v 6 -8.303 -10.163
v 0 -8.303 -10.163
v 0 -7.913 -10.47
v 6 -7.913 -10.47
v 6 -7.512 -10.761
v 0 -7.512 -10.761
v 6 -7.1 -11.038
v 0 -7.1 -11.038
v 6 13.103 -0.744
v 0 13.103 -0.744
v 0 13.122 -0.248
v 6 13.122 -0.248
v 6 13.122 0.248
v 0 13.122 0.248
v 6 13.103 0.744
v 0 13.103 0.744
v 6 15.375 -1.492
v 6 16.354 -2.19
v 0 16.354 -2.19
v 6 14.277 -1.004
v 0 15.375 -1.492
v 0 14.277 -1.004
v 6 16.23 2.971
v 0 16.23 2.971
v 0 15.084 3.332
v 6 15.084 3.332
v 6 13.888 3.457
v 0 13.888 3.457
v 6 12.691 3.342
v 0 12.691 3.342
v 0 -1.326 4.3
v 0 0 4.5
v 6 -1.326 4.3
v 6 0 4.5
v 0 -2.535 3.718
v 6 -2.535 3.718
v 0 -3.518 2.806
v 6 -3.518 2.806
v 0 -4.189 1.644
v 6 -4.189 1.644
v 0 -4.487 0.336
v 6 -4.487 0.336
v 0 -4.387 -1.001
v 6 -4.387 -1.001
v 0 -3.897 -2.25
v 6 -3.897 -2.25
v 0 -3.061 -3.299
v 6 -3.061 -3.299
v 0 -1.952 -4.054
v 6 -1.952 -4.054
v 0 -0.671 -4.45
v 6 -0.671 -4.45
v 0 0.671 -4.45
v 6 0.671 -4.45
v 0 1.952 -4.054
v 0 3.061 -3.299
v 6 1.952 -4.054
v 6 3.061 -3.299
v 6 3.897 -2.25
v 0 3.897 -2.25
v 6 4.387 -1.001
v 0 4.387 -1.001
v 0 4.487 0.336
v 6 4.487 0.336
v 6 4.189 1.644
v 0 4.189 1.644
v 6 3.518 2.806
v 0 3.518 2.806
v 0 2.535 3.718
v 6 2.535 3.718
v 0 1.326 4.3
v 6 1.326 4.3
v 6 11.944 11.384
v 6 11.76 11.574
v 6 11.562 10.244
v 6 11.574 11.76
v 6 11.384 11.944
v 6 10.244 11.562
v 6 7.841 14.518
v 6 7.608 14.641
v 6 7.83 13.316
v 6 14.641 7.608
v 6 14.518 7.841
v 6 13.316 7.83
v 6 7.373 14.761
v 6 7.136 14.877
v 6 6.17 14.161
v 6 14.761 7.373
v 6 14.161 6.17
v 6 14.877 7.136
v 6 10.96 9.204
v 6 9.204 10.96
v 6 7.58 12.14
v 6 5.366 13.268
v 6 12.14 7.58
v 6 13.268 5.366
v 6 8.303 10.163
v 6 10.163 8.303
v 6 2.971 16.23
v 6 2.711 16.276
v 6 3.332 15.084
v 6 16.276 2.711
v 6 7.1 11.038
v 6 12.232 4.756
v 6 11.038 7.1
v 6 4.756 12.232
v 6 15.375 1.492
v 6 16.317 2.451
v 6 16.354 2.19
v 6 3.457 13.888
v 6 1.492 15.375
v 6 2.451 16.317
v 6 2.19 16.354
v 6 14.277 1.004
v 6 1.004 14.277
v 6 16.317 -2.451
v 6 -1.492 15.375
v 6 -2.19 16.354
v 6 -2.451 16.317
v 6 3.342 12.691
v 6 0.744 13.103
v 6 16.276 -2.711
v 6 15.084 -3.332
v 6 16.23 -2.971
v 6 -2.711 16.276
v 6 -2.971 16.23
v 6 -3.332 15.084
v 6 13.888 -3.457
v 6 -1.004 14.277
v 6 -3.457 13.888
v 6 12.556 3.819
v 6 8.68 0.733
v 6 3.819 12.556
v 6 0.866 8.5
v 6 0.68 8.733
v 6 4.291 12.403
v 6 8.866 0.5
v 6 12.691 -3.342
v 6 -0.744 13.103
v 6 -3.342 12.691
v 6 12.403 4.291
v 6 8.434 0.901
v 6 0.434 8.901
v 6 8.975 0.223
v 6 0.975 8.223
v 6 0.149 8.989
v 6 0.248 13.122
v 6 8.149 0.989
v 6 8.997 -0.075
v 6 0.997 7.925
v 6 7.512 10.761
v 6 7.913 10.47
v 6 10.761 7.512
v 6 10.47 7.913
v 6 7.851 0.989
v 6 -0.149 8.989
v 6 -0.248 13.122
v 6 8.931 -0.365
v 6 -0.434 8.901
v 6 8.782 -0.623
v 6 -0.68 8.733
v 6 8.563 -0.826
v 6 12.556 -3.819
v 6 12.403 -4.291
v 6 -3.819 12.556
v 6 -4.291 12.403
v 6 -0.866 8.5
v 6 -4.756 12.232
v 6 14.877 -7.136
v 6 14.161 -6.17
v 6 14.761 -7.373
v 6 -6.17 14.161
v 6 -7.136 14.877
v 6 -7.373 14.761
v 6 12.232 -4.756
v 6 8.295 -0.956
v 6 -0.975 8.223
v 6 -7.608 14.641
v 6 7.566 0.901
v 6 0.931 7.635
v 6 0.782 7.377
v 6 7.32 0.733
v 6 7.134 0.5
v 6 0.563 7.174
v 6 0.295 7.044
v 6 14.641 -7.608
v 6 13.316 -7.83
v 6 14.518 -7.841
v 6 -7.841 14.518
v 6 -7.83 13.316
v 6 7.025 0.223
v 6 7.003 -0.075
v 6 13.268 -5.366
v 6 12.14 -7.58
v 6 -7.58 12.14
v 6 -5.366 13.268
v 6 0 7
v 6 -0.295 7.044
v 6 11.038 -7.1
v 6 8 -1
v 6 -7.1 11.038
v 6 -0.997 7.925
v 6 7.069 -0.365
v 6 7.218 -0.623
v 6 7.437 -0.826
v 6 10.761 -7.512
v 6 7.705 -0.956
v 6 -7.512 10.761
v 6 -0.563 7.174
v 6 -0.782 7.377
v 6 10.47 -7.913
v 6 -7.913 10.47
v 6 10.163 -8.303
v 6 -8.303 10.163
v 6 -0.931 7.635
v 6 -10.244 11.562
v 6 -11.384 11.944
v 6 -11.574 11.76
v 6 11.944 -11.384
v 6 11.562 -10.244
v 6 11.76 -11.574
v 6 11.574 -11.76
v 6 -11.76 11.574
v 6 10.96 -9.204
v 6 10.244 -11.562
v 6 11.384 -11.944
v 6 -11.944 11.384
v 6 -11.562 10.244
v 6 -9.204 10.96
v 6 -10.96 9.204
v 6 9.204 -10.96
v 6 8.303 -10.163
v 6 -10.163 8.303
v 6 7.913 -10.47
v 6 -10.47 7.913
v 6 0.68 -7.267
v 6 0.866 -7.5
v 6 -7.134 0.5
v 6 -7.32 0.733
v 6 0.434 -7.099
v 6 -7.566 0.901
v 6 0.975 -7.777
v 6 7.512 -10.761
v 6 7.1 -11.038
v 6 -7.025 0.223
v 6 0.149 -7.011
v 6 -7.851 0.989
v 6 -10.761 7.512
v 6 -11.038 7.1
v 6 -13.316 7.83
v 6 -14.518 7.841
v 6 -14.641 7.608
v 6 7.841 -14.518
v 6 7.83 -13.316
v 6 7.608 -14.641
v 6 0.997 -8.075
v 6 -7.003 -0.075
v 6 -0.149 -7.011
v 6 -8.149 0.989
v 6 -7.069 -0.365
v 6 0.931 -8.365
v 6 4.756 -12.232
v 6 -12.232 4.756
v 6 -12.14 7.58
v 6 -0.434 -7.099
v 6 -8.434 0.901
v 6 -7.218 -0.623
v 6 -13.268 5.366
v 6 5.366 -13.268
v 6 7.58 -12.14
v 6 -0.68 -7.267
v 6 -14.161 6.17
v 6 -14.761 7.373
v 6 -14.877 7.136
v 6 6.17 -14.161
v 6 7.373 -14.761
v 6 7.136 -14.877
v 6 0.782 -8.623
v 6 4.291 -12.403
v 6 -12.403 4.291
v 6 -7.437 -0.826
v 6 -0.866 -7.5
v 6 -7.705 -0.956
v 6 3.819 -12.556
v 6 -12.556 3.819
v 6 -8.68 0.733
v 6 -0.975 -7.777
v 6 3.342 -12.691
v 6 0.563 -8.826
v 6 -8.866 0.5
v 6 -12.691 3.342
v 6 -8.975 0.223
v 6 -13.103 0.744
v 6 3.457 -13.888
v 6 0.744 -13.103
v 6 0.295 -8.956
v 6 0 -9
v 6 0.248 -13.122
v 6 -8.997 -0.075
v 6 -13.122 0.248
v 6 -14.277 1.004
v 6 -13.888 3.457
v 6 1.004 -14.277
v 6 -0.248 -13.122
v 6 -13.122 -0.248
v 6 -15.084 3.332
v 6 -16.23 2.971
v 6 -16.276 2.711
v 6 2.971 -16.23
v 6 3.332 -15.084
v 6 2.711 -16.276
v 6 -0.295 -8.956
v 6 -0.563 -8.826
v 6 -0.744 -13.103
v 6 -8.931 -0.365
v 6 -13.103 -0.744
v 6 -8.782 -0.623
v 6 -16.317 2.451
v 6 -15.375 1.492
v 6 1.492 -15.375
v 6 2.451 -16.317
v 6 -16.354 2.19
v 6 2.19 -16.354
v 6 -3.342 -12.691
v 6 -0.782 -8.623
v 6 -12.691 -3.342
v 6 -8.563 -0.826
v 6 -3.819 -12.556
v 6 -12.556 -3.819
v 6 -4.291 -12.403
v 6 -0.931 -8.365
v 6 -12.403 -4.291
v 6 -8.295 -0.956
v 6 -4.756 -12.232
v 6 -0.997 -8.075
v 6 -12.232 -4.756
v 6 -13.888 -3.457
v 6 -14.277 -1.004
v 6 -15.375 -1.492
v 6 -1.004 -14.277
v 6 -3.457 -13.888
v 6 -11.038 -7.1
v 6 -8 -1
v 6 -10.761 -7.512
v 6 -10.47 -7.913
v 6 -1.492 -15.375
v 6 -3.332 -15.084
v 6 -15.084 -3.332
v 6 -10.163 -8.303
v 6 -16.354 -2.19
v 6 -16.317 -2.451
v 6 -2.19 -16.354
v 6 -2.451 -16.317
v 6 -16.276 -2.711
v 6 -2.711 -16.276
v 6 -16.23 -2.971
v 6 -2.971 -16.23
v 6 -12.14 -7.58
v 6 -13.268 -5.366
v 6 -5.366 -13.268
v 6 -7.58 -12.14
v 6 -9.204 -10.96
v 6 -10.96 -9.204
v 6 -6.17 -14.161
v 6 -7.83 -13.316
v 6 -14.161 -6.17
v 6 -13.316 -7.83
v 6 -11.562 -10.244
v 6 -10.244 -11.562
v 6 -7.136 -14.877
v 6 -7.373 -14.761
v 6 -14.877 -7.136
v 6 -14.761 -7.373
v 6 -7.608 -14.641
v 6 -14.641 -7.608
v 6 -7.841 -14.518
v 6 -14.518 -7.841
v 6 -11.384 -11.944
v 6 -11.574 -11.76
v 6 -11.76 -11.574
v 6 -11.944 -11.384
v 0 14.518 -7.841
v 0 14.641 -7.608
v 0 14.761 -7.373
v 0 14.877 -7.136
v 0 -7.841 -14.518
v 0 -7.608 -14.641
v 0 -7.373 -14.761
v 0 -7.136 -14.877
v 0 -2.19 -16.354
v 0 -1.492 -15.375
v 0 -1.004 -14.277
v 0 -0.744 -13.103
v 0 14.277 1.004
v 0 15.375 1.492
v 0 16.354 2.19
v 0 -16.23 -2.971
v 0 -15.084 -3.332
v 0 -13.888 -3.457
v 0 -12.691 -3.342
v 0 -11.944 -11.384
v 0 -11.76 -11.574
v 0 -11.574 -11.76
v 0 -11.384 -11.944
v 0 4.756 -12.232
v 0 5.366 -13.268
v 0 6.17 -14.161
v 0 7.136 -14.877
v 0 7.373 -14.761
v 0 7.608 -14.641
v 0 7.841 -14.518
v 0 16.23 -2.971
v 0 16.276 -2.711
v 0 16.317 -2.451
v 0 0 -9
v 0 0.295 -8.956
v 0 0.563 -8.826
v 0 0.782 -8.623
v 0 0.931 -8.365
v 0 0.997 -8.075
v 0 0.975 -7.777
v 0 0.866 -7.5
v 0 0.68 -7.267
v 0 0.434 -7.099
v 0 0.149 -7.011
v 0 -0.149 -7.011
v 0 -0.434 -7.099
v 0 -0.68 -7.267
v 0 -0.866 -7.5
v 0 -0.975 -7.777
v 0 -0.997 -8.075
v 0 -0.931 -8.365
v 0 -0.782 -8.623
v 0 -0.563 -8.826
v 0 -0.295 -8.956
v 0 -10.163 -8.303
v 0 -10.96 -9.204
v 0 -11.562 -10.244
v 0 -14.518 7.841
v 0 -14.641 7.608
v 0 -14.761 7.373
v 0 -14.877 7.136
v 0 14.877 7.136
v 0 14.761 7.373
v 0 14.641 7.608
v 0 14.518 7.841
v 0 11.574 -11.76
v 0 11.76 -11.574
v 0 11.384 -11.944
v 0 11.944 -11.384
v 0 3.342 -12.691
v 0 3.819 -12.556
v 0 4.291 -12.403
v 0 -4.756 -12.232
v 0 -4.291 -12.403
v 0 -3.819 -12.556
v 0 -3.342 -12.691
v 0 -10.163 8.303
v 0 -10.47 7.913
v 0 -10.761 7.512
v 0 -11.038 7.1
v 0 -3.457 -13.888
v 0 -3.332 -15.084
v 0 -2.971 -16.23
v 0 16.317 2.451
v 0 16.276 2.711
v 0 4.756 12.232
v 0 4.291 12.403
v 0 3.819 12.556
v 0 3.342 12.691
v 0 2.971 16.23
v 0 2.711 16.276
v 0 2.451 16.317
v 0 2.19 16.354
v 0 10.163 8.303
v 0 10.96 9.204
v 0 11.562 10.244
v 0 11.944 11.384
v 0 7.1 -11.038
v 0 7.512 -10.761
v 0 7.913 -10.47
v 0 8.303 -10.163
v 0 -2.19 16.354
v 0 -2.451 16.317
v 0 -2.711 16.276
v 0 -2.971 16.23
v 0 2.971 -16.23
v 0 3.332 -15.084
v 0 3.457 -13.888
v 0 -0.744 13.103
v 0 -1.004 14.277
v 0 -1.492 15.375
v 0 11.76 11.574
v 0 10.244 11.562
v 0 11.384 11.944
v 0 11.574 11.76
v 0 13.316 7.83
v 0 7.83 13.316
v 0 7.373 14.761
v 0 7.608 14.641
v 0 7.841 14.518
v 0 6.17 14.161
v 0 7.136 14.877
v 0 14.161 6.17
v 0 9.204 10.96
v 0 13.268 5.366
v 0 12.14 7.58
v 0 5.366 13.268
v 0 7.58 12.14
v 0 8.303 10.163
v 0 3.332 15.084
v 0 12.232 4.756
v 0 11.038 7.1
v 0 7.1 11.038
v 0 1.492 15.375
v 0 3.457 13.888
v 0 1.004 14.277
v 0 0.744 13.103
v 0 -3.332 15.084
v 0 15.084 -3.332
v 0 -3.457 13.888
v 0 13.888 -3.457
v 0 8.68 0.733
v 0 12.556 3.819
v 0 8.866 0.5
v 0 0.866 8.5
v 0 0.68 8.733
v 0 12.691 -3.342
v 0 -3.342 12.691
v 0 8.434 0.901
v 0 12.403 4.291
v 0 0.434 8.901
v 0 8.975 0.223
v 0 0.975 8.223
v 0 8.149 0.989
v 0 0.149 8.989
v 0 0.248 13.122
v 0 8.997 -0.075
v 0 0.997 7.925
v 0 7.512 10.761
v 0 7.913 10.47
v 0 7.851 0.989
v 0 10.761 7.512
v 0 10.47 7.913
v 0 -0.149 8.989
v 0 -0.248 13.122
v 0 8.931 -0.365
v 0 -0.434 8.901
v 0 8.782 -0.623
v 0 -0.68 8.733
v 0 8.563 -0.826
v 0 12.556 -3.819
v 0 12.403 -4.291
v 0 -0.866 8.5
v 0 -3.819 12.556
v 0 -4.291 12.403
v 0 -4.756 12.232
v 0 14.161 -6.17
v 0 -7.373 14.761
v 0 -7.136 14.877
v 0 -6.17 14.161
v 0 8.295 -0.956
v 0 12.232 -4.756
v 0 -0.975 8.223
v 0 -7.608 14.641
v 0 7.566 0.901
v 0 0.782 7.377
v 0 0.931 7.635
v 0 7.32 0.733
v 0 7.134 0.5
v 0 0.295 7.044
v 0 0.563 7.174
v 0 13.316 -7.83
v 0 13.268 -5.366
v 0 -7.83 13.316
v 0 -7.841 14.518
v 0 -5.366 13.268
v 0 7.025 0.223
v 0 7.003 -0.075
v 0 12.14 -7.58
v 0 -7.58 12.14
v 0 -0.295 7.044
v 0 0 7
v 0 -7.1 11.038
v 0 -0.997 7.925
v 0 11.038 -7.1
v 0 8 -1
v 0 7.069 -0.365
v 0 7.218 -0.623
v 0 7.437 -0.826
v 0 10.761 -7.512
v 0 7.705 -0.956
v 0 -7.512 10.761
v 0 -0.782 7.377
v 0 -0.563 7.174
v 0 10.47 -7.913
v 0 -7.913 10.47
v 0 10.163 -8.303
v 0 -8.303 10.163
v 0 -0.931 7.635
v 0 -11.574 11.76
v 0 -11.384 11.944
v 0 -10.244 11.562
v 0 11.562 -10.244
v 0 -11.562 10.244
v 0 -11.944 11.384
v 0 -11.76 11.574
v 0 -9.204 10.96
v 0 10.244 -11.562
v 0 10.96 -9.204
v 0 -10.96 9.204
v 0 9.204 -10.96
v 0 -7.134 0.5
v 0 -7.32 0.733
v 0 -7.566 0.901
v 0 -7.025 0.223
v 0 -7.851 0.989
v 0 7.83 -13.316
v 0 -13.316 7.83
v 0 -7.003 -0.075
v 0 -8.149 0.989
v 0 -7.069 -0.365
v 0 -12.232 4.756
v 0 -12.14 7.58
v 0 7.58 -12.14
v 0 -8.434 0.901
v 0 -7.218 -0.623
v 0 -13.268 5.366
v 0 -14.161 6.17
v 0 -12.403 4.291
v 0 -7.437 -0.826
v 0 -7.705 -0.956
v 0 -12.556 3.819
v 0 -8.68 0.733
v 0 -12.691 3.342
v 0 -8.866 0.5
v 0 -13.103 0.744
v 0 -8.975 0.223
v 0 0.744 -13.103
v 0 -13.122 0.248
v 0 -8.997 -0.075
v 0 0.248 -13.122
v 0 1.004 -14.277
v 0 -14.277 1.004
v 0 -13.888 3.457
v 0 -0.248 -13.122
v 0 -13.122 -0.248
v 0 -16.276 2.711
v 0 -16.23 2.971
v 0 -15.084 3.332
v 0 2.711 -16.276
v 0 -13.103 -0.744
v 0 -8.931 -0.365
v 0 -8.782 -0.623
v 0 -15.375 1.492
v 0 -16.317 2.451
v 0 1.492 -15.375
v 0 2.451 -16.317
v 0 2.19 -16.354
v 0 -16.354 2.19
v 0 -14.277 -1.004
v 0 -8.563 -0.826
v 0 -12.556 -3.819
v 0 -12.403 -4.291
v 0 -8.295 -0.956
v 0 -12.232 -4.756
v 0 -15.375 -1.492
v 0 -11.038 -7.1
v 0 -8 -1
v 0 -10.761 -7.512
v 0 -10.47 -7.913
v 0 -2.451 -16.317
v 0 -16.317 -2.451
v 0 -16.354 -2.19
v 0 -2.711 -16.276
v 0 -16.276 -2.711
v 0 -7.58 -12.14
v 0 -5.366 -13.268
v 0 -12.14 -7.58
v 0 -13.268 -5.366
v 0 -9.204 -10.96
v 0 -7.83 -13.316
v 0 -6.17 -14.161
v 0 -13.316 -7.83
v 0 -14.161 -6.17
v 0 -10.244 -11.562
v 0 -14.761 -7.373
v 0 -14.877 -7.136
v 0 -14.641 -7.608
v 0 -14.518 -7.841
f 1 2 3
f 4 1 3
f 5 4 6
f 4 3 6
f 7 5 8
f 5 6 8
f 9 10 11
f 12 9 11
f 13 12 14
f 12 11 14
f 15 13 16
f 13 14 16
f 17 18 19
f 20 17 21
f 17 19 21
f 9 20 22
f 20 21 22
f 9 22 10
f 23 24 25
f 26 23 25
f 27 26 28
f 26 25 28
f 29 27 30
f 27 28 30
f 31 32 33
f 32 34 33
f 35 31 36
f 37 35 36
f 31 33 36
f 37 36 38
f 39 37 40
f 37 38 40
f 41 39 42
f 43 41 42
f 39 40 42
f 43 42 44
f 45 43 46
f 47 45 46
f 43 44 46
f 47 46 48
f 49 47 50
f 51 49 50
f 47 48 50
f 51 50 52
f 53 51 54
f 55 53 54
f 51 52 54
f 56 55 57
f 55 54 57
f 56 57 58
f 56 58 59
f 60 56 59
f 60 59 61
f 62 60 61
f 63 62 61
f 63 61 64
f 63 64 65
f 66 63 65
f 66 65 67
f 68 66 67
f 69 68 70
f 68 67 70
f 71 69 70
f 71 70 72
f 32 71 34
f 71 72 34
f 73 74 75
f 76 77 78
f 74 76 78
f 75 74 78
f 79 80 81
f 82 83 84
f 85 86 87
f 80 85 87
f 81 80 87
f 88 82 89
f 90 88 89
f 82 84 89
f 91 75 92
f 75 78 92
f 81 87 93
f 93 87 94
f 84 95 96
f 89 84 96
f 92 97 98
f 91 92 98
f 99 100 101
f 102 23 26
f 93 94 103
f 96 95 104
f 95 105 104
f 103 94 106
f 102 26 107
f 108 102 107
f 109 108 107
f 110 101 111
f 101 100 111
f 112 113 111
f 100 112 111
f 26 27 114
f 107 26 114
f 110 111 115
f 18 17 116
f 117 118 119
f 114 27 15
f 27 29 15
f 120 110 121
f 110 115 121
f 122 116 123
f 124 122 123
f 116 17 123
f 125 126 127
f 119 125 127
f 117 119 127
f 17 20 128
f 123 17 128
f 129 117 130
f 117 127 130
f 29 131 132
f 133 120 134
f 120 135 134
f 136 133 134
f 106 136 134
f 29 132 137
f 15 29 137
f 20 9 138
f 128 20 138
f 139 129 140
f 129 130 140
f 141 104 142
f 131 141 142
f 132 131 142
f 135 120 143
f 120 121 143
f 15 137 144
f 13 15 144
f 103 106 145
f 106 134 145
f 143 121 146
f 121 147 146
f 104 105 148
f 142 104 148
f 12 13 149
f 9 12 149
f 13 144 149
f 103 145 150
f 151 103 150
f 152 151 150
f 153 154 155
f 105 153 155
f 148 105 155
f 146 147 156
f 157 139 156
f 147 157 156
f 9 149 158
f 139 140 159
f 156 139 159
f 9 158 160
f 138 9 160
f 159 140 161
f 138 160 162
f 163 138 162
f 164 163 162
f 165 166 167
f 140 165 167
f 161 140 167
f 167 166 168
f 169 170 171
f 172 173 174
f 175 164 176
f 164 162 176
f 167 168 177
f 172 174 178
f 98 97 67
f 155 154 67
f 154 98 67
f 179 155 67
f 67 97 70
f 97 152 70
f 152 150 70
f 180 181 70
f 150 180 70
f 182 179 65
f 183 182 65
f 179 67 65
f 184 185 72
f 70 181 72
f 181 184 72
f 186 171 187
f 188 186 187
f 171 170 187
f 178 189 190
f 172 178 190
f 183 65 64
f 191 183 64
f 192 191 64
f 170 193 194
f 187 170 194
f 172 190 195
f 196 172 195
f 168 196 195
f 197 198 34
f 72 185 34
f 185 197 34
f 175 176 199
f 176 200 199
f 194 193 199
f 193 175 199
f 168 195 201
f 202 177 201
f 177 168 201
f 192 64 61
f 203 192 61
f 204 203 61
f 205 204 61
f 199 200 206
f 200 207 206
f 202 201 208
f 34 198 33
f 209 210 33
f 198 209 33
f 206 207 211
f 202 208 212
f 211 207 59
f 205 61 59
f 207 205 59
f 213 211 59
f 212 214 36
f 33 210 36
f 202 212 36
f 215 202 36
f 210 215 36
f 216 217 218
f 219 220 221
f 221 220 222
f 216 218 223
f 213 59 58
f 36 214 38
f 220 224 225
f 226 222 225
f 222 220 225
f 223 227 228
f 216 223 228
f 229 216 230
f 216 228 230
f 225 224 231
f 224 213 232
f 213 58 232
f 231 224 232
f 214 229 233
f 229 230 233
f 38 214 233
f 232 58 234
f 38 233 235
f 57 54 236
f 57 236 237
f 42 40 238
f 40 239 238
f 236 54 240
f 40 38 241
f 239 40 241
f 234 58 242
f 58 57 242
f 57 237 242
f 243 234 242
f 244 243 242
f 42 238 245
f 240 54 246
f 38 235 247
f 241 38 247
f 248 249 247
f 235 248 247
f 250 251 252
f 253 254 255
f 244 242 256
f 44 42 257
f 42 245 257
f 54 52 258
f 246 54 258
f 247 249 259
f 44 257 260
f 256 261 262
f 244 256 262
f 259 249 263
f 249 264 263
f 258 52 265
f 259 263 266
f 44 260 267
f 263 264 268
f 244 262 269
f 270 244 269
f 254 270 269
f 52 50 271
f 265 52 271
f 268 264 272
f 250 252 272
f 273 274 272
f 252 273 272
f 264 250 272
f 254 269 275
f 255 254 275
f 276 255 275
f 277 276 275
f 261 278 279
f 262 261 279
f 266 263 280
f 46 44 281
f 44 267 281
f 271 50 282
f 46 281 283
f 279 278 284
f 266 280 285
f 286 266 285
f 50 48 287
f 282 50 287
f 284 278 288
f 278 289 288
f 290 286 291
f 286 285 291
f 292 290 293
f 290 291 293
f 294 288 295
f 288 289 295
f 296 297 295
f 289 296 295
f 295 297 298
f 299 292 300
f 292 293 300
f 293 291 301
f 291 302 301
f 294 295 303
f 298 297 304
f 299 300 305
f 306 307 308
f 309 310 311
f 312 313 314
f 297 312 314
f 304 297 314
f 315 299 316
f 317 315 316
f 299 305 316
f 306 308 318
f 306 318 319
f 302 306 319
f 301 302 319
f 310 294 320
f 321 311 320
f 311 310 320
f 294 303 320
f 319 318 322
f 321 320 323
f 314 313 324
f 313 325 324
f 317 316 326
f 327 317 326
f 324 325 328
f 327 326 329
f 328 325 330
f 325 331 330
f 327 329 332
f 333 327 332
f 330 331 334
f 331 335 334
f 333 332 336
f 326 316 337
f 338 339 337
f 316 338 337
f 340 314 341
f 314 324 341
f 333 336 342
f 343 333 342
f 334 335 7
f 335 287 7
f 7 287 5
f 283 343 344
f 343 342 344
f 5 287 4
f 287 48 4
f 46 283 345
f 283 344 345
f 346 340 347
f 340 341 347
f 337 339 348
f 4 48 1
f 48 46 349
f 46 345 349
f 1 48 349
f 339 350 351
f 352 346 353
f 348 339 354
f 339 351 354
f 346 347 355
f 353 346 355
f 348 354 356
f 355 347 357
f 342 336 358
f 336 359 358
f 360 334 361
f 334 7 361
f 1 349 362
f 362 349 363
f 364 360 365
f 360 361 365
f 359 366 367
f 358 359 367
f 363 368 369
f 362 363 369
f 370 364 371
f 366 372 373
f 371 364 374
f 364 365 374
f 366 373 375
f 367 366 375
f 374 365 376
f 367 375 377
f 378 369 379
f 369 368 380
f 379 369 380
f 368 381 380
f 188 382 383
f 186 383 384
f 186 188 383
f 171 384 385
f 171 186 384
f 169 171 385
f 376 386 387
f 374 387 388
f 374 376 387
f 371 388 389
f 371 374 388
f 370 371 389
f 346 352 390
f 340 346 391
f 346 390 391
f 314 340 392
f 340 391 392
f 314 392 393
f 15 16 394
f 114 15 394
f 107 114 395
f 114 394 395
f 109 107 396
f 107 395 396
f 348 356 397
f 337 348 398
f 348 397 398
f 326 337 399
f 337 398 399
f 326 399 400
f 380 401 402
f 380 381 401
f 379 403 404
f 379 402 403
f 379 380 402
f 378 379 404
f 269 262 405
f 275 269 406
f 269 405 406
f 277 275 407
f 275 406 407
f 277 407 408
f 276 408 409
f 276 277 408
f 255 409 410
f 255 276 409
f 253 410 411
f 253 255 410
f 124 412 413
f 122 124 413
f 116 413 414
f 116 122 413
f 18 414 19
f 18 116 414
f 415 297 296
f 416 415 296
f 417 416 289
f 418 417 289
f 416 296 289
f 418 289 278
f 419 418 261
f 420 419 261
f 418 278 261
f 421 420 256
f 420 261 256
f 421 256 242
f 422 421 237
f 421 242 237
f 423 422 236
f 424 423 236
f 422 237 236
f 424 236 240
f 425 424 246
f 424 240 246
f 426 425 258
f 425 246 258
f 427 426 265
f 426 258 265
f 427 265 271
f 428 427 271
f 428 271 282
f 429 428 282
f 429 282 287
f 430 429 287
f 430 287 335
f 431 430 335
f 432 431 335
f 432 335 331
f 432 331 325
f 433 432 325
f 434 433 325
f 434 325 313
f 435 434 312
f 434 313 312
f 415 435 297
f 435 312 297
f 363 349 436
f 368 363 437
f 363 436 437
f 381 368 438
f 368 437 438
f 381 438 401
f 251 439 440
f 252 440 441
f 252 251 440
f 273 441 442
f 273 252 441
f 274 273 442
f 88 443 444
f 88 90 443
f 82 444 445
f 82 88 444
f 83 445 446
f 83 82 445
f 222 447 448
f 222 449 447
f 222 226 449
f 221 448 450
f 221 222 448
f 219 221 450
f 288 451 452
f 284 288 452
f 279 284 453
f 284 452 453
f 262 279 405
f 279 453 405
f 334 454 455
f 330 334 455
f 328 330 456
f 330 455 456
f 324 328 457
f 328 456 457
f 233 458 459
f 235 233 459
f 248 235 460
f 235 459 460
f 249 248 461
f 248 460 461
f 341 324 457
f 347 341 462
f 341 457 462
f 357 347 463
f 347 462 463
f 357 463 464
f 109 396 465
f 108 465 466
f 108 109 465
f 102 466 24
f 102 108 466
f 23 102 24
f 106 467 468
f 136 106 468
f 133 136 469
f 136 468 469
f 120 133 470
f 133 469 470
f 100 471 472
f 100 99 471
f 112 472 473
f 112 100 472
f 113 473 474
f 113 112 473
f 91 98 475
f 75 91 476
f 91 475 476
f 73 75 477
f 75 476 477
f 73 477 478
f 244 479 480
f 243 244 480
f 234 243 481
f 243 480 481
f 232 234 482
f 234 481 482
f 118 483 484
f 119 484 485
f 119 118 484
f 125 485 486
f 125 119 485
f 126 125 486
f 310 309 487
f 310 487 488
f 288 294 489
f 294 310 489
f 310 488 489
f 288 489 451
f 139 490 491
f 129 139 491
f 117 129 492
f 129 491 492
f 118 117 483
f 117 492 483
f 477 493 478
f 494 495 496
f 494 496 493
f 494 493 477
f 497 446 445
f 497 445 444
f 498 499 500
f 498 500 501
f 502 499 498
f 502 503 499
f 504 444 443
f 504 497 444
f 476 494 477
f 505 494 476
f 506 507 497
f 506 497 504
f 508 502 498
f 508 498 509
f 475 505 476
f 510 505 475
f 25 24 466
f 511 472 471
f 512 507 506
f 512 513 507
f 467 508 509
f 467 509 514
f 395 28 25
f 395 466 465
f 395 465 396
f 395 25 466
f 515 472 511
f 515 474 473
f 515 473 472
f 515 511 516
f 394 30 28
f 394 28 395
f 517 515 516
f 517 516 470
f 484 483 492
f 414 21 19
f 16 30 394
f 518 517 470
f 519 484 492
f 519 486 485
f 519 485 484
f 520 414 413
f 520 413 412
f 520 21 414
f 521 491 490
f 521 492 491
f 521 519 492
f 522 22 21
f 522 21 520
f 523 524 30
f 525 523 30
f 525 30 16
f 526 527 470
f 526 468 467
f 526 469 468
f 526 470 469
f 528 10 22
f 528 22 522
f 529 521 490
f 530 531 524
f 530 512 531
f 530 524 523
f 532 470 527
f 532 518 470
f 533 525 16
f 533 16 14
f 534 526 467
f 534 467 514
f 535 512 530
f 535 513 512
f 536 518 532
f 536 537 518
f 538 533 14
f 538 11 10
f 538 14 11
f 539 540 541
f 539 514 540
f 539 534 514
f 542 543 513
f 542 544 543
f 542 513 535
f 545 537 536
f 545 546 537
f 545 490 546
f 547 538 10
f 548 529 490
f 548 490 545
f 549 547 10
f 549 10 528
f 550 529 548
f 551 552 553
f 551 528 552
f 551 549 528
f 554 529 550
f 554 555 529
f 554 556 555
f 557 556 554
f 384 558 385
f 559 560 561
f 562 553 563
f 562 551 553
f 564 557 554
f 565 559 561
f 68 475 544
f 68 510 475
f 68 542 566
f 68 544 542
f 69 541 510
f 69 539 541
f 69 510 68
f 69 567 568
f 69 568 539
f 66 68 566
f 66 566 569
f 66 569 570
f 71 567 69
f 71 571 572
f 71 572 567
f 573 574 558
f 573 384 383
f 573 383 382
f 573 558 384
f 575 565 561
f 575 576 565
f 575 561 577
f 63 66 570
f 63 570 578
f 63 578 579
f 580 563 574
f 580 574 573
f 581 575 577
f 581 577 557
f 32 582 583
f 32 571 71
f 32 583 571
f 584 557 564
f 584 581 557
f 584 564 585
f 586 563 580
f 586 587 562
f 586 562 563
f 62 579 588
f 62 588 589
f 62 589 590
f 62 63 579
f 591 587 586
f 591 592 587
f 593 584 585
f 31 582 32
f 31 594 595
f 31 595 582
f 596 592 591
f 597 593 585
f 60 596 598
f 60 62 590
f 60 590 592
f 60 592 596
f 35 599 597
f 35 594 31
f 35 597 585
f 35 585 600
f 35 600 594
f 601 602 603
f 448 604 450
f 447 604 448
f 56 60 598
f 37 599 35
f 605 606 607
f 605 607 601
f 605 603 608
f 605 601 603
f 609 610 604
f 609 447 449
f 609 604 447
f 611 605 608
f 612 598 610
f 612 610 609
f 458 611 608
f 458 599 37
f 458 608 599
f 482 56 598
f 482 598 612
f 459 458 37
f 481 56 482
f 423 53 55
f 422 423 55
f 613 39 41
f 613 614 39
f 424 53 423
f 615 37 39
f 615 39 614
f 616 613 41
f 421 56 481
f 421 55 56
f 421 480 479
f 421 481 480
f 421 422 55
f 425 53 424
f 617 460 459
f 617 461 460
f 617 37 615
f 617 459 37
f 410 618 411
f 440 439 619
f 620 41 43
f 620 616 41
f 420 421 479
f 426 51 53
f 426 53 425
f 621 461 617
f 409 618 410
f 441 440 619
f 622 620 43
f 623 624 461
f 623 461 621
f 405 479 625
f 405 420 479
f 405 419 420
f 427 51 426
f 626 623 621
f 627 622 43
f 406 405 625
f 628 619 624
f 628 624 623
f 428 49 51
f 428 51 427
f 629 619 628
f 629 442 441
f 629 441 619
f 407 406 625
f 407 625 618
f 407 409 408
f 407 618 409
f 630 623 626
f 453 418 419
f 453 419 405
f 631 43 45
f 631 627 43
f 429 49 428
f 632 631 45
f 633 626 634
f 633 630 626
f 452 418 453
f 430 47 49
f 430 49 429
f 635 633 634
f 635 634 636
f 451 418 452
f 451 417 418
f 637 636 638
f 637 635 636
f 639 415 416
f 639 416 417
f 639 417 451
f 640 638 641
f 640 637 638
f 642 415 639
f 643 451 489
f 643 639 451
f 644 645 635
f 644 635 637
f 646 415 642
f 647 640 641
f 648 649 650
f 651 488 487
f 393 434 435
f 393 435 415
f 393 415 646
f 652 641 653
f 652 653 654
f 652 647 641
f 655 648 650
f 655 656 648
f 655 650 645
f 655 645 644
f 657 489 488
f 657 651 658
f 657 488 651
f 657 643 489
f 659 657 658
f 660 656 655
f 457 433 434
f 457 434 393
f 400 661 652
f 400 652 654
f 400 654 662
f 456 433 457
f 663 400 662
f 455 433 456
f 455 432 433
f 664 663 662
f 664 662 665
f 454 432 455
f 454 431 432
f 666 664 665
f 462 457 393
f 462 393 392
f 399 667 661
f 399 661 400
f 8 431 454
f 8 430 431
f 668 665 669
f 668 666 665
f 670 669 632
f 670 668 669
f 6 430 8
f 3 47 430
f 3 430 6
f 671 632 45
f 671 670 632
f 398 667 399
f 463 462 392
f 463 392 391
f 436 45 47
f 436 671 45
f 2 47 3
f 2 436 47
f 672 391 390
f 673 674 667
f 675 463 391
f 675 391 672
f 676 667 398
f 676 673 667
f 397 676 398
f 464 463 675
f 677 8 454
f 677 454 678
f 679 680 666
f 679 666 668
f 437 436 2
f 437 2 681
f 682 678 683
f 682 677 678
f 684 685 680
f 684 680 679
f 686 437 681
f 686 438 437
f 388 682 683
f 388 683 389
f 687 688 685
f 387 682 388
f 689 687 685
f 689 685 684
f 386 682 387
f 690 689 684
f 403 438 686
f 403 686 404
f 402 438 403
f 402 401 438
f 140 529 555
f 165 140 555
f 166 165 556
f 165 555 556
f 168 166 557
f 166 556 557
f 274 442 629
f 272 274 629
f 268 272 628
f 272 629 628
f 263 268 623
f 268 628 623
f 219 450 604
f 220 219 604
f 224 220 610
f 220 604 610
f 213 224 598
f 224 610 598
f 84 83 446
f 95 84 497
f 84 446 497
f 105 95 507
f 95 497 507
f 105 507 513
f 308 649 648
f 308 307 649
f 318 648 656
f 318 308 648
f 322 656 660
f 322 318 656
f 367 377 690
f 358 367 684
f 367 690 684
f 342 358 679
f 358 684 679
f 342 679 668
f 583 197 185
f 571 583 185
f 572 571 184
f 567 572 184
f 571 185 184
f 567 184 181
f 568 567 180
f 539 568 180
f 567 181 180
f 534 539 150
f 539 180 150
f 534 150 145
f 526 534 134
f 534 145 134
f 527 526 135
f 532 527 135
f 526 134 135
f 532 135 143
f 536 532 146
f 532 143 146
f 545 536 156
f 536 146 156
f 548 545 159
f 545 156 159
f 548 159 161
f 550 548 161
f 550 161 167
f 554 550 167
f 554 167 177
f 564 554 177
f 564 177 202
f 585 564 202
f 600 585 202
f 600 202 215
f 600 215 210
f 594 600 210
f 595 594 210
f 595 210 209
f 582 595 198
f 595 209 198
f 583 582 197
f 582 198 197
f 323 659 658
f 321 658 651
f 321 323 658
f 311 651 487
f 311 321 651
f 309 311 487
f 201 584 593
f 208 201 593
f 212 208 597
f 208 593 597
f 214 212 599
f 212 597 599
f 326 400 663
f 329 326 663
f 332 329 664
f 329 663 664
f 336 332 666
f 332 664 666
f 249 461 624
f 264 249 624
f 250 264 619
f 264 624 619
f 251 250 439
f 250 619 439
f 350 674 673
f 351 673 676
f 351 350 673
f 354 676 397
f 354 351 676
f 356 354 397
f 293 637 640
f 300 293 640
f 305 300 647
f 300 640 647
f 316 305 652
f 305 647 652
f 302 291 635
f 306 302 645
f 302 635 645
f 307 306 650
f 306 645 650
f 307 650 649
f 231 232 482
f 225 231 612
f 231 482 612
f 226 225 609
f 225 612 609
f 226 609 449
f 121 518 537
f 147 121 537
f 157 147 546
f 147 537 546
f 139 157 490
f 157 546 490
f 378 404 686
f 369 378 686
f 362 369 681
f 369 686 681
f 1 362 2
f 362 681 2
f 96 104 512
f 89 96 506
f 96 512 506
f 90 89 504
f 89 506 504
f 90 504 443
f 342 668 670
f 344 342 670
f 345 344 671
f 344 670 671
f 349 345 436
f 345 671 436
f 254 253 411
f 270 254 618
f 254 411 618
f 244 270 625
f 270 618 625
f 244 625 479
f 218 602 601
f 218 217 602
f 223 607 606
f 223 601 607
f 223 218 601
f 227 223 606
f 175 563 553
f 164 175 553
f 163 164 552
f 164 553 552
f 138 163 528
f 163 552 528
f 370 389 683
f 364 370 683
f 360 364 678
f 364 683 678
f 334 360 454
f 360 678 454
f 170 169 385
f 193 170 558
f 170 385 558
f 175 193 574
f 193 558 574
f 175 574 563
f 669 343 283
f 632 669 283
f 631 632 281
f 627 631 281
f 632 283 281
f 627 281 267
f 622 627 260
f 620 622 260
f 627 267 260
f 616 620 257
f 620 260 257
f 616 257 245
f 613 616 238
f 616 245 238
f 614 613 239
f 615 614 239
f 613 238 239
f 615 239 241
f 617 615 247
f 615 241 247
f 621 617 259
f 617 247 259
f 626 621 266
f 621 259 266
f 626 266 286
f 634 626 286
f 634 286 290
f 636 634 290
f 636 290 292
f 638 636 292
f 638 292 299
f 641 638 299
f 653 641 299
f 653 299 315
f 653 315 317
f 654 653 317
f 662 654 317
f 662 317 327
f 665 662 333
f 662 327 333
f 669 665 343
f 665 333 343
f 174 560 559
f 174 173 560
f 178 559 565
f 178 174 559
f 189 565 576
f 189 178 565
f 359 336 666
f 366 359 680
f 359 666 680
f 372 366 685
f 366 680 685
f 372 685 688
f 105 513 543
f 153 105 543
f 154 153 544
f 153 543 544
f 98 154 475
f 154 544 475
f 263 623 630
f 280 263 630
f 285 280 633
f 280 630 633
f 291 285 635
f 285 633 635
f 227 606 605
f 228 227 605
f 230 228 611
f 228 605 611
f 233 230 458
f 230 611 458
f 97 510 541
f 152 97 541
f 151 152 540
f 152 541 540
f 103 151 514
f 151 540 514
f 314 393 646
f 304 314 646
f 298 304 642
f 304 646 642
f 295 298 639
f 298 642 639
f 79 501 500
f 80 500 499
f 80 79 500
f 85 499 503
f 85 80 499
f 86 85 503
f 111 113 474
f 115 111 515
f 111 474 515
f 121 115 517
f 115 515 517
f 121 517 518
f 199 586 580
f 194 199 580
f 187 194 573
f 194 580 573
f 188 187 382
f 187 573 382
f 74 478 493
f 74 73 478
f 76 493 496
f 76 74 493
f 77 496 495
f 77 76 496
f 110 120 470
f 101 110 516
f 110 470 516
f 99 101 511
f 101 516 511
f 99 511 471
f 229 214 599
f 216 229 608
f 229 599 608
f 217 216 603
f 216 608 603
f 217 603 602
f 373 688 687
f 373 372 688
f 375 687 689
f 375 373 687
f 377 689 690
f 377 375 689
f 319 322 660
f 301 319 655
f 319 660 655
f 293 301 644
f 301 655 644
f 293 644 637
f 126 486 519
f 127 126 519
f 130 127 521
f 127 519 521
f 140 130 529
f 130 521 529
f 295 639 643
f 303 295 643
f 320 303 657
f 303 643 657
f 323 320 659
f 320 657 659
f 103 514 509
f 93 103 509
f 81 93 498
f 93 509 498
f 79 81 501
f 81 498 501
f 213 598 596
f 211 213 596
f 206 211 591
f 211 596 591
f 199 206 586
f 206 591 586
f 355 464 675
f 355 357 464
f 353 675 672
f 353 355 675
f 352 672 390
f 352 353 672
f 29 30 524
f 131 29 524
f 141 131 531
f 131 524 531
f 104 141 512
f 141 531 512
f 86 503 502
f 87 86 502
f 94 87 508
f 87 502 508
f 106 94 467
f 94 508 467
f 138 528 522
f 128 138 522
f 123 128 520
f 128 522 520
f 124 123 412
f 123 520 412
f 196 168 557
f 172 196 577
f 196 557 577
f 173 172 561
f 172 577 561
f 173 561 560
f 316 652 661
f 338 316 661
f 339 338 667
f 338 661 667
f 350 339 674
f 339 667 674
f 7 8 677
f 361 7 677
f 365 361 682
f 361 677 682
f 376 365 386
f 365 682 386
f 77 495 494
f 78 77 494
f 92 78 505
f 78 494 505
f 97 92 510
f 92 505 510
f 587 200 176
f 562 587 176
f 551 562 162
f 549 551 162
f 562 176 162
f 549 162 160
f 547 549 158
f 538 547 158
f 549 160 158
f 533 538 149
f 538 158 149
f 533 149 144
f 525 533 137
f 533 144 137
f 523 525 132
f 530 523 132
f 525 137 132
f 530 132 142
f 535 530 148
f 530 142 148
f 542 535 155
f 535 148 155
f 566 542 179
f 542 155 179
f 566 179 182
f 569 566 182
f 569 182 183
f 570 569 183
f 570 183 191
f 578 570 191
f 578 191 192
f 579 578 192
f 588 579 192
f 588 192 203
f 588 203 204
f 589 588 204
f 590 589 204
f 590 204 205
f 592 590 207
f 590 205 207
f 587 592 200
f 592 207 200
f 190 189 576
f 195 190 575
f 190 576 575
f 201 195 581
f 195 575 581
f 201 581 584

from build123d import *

# Parameters (mm, degrees)
BASPROSKE_W             = 6
BASPROSKE_H             = 16.5
TOOTHCUT_DEPTH          = 25.093567606
TEETHCUTS_COUNT         = 20
TEETHCUTS_ANGLE         = 342
BORSKE_R                = 4.5
BORE_DEPTH              = 50.0000508
ESQUISSE2_R             = 1
ENL_V_MAT_EXTRU_1_DEPTH = 6


with BuildPart() as part:
    # BasProSke → Base-Revolve (revolve)
    with BuildSketch(Plane(origin=(0, 0, 0), x_dir=(1, 0, 0), z_dir=(0, 1, 0)), mode=Mode.PRIVATE) as base_revolve_sk:
        with Locations((3, 8.25)):
            Rectangle(BASPROSKE_W, BASPROSKE_H)
    revolve(base_revolve_sk.sketch.rotate(Axis((-10, 0, 0), (1, 0, 0)), 180), axis=Axis((-10, 0, 0), (1, 0, 0)))

    # TooCutSke → ToothCut (cut, through all)
    with BuildSketch(Plane(origin=(0, 0, 0), x_dir=(0, 0, -1), z_dir=(1, 0, 0))):
        with BuildLine():
            ThreePointArc((0.74381438, 13.102904875), (0, 13.124), (-0.74381438, 13.102904875))
            ThreePointArc((-0.74381438, 13.102904875), (-1.226473103, 14.852072512), (-2.209965745, 16.376962373))
            ThreePointArc((-2.209965745, 16.376962373), (0, 16.5254), (2.209965745, 16.376962373))
            ThreePointArc((2.209965745, 16.376962373), (1.226473103, 14.852072512), (0.74381438, 13.102904875))
        make_face()
    toothcut = extrude(amount=TOOTHCUT_DEPTH, mode=Mode.SUBTRACT)

    # TeethCuts: ToothCut ×20 about axis
    teethcuts_axis = Axis((-10, 0, 0), (1, 0, 0))
    for i in range(1, TEETHCUTS_COUNT):
        add(toothcut.rotate(teethcuts_axis, i * TEETHCUTS_ANGLE / (TEETHCUTS_COUNT - 1)), mode=Mode.SUBTRACT)

    # BorSke → Bore (cut, symmetric)
    with BuildSketch(Plane(origin=(0, 0, 0), x_dir=(0, 0, -1), z_dir=(1, 0, 0))):
        with Locations(Location((0, 0, 0), (0, 0, 180))):
            Circle(BORSKE_R)
    extrude(amount=BORE_DEPTH, both=True, mode=Mode.SUBTRACT)

    # Esquisse2 → Enlèv. mat.-Extru.1 (cut)
    with BuildSketch(Plane(origin=(6, 0, 0), x_dir=(0, 0, -1), z_dir=(1, 0, 0))):
        with Locations((0, 8)):
            Circle(ESQUISSE2_R)
        with Locations((8, 0)):
            Circle(ESQUISSE2_R)
        with Locations((0, -8)):
            Circle(ESQUISSE2_R)
        with Locations((-8, 0)):
            Circle(ESQUISSE2_R)
    extrude(amount=-ENL_V_MAT_EXTRU_1_DEPTH, mode=Mode.SUBTRACT)


solid = part.part
